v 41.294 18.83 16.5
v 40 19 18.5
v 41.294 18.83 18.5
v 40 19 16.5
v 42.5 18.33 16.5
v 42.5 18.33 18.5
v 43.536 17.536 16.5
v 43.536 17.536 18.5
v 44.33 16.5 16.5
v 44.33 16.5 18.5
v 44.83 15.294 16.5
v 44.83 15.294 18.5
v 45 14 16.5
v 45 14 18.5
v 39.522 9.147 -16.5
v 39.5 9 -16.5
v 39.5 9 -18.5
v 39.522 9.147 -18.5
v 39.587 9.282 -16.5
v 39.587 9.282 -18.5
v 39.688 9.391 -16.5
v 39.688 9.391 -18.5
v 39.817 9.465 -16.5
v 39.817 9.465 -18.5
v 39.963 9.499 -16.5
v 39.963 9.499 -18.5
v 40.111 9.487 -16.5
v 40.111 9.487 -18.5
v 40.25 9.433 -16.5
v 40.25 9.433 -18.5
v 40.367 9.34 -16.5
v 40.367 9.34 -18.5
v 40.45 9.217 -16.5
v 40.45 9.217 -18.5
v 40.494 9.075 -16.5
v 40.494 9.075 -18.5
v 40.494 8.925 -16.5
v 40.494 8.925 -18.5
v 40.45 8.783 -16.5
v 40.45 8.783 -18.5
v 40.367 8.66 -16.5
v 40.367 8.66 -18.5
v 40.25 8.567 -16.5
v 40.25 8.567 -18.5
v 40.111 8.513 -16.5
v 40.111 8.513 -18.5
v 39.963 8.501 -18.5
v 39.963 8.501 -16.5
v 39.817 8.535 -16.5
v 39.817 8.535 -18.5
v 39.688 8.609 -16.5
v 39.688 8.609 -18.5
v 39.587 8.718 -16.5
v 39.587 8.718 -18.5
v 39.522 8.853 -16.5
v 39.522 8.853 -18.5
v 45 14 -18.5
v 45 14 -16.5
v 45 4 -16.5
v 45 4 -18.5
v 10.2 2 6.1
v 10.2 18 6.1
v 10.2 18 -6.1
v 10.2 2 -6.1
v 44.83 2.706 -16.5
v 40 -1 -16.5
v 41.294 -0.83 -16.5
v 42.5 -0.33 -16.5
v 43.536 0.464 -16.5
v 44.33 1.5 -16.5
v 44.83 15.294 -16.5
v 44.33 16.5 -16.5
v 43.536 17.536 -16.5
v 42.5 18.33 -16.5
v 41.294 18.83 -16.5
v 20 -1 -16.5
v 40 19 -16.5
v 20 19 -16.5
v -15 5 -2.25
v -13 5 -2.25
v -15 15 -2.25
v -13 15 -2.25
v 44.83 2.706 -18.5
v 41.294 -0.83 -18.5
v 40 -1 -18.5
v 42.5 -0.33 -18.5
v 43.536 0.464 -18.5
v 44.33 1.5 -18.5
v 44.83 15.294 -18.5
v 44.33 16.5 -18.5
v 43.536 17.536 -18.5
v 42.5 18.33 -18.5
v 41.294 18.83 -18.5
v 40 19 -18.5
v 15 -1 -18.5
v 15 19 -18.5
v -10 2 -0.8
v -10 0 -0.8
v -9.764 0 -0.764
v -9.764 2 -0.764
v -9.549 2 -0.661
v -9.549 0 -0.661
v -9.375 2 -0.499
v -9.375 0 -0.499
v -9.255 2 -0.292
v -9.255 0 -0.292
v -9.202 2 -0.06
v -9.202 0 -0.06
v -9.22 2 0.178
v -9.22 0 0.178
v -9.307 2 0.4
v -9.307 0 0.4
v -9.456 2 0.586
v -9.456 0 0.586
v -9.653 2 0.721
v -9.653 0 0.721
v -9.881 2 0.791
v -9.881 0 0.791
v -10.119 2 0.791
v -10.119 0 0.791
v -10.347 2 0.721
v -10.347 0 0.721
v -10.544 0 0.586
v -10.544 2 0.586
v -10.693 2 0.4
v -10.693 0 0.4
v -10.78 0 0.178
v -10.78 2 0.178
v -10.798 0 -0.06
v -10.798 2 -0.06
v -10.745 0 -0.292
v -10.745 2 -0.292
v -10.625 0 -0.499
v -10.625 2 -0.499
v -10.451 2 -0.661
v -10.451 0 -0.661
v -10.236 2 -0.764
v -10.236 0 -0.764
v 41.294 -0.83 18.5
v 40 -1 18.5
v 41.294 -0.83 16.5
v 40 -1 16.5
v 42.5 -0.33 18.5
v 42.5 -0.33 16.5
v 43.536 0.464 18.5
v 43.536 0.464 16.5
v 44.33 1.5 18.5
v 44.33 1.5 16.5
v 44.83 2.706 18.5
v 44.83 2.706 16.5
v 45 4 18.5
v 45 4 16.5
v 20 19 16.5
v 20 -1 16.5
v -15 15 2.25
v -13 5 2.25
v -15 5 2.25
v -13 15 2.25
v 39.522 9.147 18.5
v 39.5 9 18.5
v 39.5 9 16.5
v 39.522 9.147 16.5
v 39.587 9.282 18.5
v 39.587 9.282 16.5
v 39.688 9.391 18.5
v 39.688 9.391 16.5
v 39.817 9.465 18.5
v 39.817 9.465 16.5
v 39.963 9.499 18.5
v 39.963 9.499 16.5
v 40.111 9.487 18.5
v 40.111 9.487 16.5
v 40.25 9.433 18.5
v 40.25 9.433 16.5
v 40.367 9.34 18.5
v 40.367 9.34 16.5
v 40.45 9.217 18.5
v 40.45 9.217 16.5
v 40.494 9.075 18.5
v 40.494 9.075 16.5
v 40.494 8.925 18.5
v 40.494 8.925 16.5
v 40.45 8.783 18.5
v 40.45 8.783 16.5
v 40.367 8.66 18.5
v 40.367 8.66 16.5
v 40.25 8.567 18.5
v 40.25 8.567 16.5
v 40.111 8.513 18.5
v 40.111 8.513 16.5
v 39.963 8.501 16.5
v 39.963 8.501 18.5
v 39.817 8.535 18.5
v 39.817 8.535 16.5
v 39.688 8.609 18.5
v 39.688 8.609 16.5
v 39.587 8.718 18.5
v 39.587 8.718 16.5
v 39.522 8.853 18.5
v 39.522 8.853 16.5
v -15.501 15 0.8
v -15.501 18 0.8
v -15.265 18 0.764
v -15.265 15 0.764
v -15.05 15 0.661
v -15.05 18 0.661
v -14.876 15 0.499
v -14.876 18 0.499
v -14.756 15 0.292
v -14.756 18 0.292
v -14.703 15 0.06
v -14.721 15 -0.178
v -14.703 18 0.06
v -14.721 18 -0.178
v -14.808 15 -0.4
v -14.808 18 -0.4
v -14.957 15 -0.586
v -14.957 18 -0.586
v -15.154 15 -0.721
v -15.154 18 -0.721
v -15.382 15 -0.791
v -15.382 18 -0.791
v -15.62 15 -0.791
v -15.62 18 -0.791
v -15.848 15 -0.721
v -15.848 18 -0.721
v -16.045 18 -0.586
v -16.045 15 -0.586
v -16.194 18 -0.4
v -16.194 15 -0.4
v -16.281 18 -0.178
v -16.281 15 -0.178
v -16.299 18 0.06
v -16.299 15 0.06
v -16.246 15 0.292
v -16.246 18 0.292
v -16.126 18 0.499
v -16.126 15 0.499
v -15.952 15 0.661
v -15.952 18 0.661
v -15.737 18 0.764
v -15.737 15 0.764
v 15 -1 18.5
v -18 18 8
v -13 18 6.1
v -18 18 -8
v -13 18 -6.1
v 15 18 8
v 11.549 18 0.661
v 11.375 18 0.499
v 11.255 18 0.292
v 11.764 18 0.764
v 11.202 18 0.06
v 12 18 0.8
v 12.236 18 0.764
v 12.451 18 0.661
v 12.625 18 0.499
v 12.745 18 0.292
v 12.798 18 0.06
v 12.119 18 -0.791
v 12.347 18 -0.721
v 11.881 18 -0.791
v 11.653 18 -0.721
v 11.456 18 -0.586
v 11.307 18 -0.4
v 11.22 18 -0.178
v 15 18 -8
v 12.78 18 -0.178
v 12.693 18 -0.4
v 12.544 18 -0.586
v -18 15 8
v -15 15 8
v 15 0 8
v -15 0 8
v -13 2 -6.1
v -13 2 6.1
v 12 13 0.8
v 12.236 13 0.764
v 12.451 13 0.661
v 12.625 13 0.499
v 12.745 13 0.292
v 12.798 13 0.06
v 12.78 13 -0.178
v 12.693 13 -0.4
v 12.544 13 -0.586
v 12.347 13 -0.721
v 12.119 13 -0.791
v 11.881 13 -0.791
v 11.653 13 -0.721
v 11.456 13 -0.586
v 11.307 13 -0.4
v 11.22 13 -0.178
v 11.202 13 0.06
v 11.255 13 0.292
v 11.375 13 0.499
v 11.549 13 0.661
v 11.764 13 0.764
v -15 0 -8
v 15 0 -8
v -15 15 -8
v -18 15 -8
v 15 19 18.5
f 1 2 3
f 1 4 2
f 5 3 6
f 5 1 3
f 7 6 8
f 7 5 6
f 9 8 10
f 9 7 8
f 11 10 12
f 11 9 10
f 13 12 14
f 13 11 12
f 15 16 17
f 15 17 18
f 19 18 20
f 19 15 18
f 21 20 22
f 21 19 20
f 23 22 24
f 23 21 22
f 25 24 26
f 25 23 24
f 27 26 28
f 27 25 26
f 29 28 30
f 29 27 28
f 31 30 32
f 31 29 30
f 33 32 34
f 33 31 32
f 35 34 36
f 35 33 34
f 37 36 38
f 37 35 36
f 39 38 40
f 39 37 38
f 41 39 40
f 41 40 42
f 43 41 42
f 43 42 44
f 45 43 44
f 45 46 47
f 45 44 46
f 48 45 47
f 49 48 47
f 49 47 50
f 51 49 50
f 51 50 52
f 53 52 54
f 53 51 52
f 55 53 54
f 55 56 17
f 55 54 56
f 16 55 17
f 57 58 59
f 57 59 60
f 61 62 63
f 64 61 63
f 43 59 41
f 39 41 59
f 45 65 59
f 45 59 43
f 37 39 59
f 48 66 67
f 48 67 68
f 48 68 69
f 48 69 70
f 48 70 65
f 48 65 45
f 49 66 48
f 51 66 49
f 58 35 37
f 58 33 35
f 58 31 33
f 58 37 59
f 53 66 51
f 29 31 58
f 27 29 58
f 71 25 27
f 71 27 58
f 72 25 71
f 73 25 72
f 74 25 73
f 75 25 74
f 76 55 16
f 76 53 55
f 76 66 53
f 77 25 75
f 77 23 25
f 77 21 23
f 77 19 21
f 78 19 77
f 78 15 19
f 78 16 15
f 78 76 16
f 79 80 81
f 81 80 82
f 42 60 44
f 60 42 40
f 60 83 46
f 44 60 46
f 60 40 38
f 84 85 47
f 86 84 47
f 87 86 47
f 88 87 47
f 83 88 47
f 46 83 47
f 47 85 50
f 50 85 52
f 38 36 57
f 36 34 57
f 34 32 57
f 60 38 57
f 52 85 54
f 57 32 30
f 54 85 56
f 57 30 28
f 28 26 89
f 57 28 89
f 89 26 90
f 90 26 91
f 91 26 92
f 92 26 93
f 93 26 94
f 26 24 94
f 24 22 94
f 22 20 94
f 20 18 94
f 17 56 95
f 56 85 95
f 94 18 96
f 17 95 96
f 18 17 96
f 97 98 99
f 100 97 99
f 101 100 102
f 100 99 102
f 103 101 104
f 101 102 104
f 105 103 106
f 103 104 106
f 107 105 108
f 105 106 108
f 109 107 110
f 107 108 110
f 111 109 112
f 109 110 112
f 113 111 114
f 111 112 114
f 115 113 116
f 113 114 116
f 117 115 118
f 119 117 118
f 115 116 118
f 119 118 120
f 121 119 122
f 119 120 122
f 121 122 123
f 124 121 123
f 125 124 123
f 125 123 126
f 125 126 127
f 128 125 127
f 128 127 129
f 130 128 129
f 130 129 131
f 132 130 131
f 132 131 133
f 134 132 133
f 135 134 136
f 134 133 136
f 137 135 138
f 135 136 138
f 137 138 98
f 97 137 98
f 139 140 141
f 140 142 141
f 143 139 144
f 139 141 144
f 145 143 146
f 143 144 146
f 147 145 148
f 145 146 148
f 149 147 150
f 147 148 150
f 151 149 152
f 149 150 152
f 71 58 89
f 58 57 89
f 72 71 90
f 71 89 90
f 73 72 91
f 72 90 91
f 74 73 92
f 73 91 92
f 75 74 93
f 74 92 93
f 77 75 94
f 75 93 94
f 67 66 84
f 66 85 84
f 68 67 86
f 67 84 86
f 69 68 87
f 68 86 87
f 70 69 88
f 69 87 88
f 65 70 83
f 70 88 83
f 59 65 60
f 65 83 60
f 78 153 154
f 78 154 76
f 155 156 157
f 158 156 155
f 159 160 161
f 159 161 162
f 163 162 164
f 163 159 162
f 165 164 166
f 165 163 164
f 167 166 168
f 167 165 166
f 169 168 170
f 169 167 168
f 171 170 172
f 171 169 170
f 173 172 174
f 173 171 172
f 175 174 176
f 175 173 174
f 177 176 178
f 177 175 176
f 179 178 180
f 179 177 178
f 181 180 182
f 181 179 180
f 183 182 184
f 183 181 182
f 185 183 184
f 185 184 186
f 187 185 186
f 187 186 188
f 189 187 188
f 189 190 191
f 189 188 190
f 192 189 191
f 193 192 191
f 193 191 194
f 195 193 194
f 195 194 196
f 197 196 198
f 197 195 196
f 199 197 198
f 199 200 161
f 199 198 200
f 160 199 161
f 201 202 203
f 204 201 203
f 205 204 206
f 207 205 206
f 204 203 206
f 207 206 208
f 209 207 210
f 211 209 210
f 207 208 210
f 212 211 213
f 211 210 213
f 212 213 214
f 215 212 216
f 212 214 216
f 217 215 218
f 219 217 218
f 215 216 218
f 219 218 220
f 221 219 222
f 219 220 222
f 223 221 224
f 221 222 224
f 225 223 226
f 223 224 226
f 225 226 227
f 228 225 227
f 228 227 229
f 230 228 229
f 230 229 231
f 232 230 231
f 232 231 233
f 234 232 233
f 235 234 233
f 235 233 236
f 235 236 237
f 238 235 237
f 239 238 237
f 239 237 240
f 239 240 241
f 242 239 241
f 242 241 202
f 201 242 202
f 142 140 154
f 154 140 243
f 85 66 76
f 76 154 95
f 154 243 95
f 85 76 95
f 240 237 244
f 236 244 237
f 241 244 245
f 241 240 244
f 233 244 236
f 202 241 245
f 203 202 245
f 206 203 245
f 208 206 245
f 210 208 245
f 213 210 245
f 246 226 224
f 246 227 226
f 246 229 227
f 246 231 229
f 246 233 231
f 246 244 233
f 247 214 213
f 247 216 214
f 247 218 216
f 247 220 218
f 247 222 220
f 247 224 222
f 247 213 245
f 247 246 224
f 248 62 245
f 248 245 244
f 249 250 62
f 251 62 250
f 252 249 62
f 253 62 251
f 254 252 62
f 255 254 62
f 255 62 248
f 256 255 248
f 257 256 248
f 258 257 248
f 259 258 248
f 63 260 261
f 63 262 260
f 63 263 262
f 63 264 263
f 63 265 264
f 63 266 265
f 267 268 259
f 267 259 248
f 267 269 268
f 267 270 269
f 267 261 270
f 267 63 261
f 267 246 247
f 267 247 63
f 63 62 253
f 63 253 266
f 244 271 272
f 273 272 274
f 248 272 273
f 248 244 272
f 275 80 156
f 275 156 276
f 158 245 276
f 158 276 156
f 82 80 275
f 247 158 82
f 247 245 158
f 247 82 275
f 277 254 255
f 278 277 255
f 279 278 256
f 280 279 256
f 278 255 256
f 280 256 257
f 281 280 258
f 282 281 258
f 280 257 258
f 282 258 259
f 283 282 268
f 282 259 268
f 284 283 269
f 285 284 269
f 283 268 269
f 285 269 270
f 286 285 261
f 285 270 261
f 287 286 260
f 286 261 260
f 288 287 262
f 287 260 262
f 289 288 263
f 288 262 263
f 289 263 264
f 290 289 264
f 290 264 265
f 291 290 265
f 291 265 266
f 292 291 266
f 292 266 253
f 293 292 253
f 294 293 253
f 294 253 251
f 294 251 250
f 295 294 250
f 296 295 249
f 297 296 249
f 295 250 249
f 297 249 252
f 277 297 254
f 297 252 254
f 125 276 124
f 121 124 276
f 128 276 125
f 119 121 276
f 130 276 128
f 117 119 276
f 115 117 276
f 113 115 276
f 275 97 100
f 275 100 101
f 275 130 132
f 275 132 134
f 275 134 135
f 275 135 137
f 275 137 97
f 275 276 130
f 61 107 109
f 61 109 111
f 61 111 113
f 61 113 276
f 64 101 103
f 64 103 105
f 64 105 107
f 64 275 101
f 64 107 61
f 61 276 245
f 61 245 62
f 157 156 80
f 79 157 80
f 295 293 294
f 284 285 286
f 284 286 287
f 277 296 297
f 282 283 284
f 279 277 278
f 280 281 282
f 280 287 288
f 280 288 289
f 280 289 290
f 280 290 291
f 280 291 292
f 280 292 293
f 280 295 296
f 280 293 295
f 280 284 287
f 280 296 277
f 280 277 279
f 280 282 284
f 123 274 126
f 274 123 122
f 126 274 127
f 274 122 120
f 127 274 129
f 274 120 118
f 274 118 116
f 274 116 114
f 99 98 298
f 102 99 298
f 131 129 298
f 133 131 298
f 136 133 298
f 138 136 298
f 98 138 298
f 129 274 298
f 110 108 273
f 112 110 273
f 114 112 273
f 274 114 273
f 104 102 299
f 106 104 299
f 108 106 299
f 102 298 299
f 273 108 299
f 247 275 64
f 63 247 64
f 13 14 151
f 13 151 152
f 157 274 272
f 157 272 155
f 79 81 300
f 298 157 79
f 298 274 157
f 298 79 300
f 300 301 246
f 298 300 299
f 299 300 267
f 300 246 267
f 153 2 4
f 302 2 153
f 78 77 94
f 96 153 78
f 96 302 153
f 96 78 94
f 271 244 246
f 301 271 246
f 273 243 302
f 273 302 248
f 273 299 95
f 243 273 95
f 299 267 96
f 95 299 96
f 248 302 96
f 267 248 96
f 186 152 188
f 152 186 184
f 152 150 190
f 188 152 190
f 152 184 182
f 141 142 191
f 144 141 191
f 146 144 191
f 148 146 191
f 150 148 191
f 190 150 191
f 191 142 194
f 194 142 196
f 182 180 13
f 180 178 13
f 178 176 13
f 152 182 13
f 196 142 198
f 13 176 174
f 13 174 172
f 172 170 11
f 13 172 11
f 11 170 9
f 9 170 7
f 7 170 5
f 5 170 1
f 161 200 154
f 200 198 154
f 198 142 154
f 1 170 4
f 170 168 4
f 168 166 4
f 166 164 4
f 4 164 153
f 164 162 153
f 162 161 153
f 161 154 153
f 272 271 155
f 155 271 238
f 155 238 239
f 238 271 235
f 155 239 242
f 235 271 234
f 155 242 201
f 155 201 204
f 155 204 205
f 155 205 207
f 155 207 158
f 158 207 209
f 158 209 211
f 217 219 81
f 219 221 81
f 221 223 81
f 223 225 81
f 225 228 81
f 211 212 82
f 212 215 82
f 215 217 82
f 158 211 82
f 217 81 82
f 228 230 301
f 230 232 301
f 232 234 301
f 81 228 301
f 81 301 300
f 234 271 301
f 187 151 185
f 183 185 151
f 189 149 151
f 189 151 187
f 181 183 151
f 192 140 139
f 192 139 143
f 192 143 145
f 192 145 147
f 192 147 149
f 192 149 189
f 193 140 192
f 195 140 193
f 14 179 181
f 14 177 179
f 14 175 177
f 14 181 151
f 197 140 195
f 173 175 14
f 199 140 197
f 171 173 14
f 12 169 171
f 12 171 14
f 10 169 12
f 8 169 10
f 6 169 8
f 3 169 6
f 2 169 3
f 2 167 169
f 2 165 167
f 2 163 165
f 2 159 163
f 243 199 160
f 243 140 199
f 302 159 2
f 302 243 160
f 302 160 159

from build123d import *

# Parameters (mm, degrees)
SKETCH1_W               = 30
SKETCH1_H               = 16
BOSS_EXTRUDE1_DEPTH     = 2
SKETCH2_W               = 23.2
SKETCH2_H               = 12.2
BOSS_EXTRUDE2_DEPTH     = 16
CUT_EXTRUDE1_REACH      = 36.234
SKETCH3_W               = 4.5
SKETCH3_H               = 13
SKETCH8_R               = 0.8
CUT_EXTRUDE3_DEPTH      = 2
SKETCH9_W               = 5
SKETCH9_H               = 16
SKETCH9_W_2             = 4
BOSS_EXTRUDE4_DEPTH     = 3
SKETCH10_R              = 0.8
CUT_EXTRUDE4_DEPTH      = 5
SKETCH11_W              = 37
SKETCH11_H              = 20
BOSS_EXTRUDE5_DEPTH     = 5
SKETCH12_W              = 2
SKETCH12_H              = 20
BOSS_EXTRUDE6_DEPTH     = 25
FILLET1_R               = 5
CUT_EXTRUDE5_DEPTH      = 62.278054799
CUT_EXTRUDE5_DEPTH_BACK = 62.278054799
SKETCH13_R              = 0.5


with BuildPart() as part:
    # Sketch1 → Boss-Extrude1 (new body)
    with BuildSketch(Plane(origin=(0, 0, 0), x_dir=(1, 0, 0), z_dir=(0, 1, 0))):
        Rectangle(SKETCH1_W, SKETCH1_H)
    extrude(amount=BOSS_EXTRUDE1_DEPTH)

    # Sketch2 → Boss-Extrude2 (add)
    with BuildSketch(Plane(origin=(0, 2, 0), x_dir=(1, 0, 0), z_dir=(0, 1, 0))):
        Polygon((-15, 8), (-13, 8), (10.2, 8), (15, 8), (15, -8), (10.2, -8), (-13, -8), (-15, -8), align=None)
        with Locations((-1.4, 0)):
            Rectangle(SKETCH2_W, SKETCH2_H, mode=Mode.SUBTRACT)
    extrude(amount=BOSS_EXTRUDE2_DEPTH)

    # Sketch3 → Cut-Extrude1 (cut, up to next)
    with BuildSketch(Plane(origin=(-13, 0, 0), x_dir=(0, 0, -1), z_dir=(1, 0, 0)), mode=Mode.PRIVATE) as cut_extrude1_sk1:
        with Locations((0, 11.5)):
            Rectangle(SKETCH3_W, SKETCH3_H)
    cut_extrude1_tool1 = extrude(cut_extrude1_sk1.sketch, amount=-CUT_EXTRUDE1_REACH, mode=Mode.PRIVATE) & part.part
    add(cut_extrude1_tool1.solids().sort_by_distance((-13, 11.5, 0))[0], mode=Mode.SUBTRACT)

    # Sketch8 → Cut-Extrude3 (cut)
    with BuildSketch(Plane.XZ):
        with Locations(Location((-10, 0, 0), (0, 0, 270))):
            Circle(SKETCH8_R)
    extrude(amount=-CUT_EXTRUDE3_DEPTH, mode=Mode.SUBTRACT)

    # Sketch9 → Boss-Extrude4 (add)
    with BuildSketch(Plane(origin=(0, 18, 0), x_dir=(1, 0, 0), z_dir=(0, 1, 0))):
        with Locations((-15.5, 0)):
            Rectangle(SKETCH9_W, SKETCH9_H)
        with Locations((12.2, 0)):
            Rectangle(SKETCH9_W_2, SKETCH9_H)
    extrude(amount=-BOSS_EXTRUDE4_DEPTH)

    # Sketch10 → Cut-Extrude4 (cut)
    with BuildSketch(Plane(origin=(0, 18, 0), x_dir=(1, 0, 0), z_dir=(0, 1, 0))):
        with Locations(Location((12, 0, 0), (0, 0, 270))):
            Circle(SKETCH10_R)
        with Locations(Location((-15.500971551, 0, 0), (0, 0, 270))):
            Circle(SKETCH10_R)
    extrude(amount=-CUT_EXTRUDE4_DEPTH, mode=Mode.SUBTRACT)

    # Sketch11 → Boss-Extrude5 (add)
    with BuildSketch(Plane(origin=(15, 0, 0), x_dir=(0, 0, -1), z_dir=(1, 0, 0))):
        with Locations((0, 9)):
            Rectangle(SKETCH11_W, SKETCH11_H)
    extrude(amount=BOSS_EXTRUDE5_DEPTH)

    # Sketch12 → Boss-Extrude6 (add)
    with BuildSketch(Plane(origin=(20, 0, 0), x_dir=(0, 0, -1), z_dir=(1, 0, 0))):
        with Locations((-17.5, 9)):
            Rectangle(SKETCH12_W, SKETCH12_H)
        with Locations((17.5, 9)):
            Rectangle(SKETCH12_W, SKETCH12_H)
    extrude(amount=BOSS_EXTRUDE6_DEPTH)

    # Fillet1
    fillet1_edges = [part.edges().sort_by_distance(p)[0] for p in [
        (45, 19, -17.5),
        (45, -1, -17.5),
        (45, 19, 17.5),
        (45, -1, 17.5),
    ]]
    fillet(fillet1_edges, radius=FILLET1_R)

    # Sketch13 → Cut-Extrude5 (cut, two sides: drawn at the far end of the back side and taken through both)
    with BuildSketch(Plane(origin=(0, 0, -18.5), x_dir=(-1, 0, 0), z_dir=(0, 0, -1)).offset(-CUT_EXTRUDE5_DEPTH_BACK)):
        with Locations((-40, 9)):
            Circle(SKETCH13_R)
    extrude(amount=CUT_EXTRUDE5_DEPTH + CUT_EXTRUDE5_DEPTH_BACK, mode=Mode.SUBTRACT)


solid = part.part
